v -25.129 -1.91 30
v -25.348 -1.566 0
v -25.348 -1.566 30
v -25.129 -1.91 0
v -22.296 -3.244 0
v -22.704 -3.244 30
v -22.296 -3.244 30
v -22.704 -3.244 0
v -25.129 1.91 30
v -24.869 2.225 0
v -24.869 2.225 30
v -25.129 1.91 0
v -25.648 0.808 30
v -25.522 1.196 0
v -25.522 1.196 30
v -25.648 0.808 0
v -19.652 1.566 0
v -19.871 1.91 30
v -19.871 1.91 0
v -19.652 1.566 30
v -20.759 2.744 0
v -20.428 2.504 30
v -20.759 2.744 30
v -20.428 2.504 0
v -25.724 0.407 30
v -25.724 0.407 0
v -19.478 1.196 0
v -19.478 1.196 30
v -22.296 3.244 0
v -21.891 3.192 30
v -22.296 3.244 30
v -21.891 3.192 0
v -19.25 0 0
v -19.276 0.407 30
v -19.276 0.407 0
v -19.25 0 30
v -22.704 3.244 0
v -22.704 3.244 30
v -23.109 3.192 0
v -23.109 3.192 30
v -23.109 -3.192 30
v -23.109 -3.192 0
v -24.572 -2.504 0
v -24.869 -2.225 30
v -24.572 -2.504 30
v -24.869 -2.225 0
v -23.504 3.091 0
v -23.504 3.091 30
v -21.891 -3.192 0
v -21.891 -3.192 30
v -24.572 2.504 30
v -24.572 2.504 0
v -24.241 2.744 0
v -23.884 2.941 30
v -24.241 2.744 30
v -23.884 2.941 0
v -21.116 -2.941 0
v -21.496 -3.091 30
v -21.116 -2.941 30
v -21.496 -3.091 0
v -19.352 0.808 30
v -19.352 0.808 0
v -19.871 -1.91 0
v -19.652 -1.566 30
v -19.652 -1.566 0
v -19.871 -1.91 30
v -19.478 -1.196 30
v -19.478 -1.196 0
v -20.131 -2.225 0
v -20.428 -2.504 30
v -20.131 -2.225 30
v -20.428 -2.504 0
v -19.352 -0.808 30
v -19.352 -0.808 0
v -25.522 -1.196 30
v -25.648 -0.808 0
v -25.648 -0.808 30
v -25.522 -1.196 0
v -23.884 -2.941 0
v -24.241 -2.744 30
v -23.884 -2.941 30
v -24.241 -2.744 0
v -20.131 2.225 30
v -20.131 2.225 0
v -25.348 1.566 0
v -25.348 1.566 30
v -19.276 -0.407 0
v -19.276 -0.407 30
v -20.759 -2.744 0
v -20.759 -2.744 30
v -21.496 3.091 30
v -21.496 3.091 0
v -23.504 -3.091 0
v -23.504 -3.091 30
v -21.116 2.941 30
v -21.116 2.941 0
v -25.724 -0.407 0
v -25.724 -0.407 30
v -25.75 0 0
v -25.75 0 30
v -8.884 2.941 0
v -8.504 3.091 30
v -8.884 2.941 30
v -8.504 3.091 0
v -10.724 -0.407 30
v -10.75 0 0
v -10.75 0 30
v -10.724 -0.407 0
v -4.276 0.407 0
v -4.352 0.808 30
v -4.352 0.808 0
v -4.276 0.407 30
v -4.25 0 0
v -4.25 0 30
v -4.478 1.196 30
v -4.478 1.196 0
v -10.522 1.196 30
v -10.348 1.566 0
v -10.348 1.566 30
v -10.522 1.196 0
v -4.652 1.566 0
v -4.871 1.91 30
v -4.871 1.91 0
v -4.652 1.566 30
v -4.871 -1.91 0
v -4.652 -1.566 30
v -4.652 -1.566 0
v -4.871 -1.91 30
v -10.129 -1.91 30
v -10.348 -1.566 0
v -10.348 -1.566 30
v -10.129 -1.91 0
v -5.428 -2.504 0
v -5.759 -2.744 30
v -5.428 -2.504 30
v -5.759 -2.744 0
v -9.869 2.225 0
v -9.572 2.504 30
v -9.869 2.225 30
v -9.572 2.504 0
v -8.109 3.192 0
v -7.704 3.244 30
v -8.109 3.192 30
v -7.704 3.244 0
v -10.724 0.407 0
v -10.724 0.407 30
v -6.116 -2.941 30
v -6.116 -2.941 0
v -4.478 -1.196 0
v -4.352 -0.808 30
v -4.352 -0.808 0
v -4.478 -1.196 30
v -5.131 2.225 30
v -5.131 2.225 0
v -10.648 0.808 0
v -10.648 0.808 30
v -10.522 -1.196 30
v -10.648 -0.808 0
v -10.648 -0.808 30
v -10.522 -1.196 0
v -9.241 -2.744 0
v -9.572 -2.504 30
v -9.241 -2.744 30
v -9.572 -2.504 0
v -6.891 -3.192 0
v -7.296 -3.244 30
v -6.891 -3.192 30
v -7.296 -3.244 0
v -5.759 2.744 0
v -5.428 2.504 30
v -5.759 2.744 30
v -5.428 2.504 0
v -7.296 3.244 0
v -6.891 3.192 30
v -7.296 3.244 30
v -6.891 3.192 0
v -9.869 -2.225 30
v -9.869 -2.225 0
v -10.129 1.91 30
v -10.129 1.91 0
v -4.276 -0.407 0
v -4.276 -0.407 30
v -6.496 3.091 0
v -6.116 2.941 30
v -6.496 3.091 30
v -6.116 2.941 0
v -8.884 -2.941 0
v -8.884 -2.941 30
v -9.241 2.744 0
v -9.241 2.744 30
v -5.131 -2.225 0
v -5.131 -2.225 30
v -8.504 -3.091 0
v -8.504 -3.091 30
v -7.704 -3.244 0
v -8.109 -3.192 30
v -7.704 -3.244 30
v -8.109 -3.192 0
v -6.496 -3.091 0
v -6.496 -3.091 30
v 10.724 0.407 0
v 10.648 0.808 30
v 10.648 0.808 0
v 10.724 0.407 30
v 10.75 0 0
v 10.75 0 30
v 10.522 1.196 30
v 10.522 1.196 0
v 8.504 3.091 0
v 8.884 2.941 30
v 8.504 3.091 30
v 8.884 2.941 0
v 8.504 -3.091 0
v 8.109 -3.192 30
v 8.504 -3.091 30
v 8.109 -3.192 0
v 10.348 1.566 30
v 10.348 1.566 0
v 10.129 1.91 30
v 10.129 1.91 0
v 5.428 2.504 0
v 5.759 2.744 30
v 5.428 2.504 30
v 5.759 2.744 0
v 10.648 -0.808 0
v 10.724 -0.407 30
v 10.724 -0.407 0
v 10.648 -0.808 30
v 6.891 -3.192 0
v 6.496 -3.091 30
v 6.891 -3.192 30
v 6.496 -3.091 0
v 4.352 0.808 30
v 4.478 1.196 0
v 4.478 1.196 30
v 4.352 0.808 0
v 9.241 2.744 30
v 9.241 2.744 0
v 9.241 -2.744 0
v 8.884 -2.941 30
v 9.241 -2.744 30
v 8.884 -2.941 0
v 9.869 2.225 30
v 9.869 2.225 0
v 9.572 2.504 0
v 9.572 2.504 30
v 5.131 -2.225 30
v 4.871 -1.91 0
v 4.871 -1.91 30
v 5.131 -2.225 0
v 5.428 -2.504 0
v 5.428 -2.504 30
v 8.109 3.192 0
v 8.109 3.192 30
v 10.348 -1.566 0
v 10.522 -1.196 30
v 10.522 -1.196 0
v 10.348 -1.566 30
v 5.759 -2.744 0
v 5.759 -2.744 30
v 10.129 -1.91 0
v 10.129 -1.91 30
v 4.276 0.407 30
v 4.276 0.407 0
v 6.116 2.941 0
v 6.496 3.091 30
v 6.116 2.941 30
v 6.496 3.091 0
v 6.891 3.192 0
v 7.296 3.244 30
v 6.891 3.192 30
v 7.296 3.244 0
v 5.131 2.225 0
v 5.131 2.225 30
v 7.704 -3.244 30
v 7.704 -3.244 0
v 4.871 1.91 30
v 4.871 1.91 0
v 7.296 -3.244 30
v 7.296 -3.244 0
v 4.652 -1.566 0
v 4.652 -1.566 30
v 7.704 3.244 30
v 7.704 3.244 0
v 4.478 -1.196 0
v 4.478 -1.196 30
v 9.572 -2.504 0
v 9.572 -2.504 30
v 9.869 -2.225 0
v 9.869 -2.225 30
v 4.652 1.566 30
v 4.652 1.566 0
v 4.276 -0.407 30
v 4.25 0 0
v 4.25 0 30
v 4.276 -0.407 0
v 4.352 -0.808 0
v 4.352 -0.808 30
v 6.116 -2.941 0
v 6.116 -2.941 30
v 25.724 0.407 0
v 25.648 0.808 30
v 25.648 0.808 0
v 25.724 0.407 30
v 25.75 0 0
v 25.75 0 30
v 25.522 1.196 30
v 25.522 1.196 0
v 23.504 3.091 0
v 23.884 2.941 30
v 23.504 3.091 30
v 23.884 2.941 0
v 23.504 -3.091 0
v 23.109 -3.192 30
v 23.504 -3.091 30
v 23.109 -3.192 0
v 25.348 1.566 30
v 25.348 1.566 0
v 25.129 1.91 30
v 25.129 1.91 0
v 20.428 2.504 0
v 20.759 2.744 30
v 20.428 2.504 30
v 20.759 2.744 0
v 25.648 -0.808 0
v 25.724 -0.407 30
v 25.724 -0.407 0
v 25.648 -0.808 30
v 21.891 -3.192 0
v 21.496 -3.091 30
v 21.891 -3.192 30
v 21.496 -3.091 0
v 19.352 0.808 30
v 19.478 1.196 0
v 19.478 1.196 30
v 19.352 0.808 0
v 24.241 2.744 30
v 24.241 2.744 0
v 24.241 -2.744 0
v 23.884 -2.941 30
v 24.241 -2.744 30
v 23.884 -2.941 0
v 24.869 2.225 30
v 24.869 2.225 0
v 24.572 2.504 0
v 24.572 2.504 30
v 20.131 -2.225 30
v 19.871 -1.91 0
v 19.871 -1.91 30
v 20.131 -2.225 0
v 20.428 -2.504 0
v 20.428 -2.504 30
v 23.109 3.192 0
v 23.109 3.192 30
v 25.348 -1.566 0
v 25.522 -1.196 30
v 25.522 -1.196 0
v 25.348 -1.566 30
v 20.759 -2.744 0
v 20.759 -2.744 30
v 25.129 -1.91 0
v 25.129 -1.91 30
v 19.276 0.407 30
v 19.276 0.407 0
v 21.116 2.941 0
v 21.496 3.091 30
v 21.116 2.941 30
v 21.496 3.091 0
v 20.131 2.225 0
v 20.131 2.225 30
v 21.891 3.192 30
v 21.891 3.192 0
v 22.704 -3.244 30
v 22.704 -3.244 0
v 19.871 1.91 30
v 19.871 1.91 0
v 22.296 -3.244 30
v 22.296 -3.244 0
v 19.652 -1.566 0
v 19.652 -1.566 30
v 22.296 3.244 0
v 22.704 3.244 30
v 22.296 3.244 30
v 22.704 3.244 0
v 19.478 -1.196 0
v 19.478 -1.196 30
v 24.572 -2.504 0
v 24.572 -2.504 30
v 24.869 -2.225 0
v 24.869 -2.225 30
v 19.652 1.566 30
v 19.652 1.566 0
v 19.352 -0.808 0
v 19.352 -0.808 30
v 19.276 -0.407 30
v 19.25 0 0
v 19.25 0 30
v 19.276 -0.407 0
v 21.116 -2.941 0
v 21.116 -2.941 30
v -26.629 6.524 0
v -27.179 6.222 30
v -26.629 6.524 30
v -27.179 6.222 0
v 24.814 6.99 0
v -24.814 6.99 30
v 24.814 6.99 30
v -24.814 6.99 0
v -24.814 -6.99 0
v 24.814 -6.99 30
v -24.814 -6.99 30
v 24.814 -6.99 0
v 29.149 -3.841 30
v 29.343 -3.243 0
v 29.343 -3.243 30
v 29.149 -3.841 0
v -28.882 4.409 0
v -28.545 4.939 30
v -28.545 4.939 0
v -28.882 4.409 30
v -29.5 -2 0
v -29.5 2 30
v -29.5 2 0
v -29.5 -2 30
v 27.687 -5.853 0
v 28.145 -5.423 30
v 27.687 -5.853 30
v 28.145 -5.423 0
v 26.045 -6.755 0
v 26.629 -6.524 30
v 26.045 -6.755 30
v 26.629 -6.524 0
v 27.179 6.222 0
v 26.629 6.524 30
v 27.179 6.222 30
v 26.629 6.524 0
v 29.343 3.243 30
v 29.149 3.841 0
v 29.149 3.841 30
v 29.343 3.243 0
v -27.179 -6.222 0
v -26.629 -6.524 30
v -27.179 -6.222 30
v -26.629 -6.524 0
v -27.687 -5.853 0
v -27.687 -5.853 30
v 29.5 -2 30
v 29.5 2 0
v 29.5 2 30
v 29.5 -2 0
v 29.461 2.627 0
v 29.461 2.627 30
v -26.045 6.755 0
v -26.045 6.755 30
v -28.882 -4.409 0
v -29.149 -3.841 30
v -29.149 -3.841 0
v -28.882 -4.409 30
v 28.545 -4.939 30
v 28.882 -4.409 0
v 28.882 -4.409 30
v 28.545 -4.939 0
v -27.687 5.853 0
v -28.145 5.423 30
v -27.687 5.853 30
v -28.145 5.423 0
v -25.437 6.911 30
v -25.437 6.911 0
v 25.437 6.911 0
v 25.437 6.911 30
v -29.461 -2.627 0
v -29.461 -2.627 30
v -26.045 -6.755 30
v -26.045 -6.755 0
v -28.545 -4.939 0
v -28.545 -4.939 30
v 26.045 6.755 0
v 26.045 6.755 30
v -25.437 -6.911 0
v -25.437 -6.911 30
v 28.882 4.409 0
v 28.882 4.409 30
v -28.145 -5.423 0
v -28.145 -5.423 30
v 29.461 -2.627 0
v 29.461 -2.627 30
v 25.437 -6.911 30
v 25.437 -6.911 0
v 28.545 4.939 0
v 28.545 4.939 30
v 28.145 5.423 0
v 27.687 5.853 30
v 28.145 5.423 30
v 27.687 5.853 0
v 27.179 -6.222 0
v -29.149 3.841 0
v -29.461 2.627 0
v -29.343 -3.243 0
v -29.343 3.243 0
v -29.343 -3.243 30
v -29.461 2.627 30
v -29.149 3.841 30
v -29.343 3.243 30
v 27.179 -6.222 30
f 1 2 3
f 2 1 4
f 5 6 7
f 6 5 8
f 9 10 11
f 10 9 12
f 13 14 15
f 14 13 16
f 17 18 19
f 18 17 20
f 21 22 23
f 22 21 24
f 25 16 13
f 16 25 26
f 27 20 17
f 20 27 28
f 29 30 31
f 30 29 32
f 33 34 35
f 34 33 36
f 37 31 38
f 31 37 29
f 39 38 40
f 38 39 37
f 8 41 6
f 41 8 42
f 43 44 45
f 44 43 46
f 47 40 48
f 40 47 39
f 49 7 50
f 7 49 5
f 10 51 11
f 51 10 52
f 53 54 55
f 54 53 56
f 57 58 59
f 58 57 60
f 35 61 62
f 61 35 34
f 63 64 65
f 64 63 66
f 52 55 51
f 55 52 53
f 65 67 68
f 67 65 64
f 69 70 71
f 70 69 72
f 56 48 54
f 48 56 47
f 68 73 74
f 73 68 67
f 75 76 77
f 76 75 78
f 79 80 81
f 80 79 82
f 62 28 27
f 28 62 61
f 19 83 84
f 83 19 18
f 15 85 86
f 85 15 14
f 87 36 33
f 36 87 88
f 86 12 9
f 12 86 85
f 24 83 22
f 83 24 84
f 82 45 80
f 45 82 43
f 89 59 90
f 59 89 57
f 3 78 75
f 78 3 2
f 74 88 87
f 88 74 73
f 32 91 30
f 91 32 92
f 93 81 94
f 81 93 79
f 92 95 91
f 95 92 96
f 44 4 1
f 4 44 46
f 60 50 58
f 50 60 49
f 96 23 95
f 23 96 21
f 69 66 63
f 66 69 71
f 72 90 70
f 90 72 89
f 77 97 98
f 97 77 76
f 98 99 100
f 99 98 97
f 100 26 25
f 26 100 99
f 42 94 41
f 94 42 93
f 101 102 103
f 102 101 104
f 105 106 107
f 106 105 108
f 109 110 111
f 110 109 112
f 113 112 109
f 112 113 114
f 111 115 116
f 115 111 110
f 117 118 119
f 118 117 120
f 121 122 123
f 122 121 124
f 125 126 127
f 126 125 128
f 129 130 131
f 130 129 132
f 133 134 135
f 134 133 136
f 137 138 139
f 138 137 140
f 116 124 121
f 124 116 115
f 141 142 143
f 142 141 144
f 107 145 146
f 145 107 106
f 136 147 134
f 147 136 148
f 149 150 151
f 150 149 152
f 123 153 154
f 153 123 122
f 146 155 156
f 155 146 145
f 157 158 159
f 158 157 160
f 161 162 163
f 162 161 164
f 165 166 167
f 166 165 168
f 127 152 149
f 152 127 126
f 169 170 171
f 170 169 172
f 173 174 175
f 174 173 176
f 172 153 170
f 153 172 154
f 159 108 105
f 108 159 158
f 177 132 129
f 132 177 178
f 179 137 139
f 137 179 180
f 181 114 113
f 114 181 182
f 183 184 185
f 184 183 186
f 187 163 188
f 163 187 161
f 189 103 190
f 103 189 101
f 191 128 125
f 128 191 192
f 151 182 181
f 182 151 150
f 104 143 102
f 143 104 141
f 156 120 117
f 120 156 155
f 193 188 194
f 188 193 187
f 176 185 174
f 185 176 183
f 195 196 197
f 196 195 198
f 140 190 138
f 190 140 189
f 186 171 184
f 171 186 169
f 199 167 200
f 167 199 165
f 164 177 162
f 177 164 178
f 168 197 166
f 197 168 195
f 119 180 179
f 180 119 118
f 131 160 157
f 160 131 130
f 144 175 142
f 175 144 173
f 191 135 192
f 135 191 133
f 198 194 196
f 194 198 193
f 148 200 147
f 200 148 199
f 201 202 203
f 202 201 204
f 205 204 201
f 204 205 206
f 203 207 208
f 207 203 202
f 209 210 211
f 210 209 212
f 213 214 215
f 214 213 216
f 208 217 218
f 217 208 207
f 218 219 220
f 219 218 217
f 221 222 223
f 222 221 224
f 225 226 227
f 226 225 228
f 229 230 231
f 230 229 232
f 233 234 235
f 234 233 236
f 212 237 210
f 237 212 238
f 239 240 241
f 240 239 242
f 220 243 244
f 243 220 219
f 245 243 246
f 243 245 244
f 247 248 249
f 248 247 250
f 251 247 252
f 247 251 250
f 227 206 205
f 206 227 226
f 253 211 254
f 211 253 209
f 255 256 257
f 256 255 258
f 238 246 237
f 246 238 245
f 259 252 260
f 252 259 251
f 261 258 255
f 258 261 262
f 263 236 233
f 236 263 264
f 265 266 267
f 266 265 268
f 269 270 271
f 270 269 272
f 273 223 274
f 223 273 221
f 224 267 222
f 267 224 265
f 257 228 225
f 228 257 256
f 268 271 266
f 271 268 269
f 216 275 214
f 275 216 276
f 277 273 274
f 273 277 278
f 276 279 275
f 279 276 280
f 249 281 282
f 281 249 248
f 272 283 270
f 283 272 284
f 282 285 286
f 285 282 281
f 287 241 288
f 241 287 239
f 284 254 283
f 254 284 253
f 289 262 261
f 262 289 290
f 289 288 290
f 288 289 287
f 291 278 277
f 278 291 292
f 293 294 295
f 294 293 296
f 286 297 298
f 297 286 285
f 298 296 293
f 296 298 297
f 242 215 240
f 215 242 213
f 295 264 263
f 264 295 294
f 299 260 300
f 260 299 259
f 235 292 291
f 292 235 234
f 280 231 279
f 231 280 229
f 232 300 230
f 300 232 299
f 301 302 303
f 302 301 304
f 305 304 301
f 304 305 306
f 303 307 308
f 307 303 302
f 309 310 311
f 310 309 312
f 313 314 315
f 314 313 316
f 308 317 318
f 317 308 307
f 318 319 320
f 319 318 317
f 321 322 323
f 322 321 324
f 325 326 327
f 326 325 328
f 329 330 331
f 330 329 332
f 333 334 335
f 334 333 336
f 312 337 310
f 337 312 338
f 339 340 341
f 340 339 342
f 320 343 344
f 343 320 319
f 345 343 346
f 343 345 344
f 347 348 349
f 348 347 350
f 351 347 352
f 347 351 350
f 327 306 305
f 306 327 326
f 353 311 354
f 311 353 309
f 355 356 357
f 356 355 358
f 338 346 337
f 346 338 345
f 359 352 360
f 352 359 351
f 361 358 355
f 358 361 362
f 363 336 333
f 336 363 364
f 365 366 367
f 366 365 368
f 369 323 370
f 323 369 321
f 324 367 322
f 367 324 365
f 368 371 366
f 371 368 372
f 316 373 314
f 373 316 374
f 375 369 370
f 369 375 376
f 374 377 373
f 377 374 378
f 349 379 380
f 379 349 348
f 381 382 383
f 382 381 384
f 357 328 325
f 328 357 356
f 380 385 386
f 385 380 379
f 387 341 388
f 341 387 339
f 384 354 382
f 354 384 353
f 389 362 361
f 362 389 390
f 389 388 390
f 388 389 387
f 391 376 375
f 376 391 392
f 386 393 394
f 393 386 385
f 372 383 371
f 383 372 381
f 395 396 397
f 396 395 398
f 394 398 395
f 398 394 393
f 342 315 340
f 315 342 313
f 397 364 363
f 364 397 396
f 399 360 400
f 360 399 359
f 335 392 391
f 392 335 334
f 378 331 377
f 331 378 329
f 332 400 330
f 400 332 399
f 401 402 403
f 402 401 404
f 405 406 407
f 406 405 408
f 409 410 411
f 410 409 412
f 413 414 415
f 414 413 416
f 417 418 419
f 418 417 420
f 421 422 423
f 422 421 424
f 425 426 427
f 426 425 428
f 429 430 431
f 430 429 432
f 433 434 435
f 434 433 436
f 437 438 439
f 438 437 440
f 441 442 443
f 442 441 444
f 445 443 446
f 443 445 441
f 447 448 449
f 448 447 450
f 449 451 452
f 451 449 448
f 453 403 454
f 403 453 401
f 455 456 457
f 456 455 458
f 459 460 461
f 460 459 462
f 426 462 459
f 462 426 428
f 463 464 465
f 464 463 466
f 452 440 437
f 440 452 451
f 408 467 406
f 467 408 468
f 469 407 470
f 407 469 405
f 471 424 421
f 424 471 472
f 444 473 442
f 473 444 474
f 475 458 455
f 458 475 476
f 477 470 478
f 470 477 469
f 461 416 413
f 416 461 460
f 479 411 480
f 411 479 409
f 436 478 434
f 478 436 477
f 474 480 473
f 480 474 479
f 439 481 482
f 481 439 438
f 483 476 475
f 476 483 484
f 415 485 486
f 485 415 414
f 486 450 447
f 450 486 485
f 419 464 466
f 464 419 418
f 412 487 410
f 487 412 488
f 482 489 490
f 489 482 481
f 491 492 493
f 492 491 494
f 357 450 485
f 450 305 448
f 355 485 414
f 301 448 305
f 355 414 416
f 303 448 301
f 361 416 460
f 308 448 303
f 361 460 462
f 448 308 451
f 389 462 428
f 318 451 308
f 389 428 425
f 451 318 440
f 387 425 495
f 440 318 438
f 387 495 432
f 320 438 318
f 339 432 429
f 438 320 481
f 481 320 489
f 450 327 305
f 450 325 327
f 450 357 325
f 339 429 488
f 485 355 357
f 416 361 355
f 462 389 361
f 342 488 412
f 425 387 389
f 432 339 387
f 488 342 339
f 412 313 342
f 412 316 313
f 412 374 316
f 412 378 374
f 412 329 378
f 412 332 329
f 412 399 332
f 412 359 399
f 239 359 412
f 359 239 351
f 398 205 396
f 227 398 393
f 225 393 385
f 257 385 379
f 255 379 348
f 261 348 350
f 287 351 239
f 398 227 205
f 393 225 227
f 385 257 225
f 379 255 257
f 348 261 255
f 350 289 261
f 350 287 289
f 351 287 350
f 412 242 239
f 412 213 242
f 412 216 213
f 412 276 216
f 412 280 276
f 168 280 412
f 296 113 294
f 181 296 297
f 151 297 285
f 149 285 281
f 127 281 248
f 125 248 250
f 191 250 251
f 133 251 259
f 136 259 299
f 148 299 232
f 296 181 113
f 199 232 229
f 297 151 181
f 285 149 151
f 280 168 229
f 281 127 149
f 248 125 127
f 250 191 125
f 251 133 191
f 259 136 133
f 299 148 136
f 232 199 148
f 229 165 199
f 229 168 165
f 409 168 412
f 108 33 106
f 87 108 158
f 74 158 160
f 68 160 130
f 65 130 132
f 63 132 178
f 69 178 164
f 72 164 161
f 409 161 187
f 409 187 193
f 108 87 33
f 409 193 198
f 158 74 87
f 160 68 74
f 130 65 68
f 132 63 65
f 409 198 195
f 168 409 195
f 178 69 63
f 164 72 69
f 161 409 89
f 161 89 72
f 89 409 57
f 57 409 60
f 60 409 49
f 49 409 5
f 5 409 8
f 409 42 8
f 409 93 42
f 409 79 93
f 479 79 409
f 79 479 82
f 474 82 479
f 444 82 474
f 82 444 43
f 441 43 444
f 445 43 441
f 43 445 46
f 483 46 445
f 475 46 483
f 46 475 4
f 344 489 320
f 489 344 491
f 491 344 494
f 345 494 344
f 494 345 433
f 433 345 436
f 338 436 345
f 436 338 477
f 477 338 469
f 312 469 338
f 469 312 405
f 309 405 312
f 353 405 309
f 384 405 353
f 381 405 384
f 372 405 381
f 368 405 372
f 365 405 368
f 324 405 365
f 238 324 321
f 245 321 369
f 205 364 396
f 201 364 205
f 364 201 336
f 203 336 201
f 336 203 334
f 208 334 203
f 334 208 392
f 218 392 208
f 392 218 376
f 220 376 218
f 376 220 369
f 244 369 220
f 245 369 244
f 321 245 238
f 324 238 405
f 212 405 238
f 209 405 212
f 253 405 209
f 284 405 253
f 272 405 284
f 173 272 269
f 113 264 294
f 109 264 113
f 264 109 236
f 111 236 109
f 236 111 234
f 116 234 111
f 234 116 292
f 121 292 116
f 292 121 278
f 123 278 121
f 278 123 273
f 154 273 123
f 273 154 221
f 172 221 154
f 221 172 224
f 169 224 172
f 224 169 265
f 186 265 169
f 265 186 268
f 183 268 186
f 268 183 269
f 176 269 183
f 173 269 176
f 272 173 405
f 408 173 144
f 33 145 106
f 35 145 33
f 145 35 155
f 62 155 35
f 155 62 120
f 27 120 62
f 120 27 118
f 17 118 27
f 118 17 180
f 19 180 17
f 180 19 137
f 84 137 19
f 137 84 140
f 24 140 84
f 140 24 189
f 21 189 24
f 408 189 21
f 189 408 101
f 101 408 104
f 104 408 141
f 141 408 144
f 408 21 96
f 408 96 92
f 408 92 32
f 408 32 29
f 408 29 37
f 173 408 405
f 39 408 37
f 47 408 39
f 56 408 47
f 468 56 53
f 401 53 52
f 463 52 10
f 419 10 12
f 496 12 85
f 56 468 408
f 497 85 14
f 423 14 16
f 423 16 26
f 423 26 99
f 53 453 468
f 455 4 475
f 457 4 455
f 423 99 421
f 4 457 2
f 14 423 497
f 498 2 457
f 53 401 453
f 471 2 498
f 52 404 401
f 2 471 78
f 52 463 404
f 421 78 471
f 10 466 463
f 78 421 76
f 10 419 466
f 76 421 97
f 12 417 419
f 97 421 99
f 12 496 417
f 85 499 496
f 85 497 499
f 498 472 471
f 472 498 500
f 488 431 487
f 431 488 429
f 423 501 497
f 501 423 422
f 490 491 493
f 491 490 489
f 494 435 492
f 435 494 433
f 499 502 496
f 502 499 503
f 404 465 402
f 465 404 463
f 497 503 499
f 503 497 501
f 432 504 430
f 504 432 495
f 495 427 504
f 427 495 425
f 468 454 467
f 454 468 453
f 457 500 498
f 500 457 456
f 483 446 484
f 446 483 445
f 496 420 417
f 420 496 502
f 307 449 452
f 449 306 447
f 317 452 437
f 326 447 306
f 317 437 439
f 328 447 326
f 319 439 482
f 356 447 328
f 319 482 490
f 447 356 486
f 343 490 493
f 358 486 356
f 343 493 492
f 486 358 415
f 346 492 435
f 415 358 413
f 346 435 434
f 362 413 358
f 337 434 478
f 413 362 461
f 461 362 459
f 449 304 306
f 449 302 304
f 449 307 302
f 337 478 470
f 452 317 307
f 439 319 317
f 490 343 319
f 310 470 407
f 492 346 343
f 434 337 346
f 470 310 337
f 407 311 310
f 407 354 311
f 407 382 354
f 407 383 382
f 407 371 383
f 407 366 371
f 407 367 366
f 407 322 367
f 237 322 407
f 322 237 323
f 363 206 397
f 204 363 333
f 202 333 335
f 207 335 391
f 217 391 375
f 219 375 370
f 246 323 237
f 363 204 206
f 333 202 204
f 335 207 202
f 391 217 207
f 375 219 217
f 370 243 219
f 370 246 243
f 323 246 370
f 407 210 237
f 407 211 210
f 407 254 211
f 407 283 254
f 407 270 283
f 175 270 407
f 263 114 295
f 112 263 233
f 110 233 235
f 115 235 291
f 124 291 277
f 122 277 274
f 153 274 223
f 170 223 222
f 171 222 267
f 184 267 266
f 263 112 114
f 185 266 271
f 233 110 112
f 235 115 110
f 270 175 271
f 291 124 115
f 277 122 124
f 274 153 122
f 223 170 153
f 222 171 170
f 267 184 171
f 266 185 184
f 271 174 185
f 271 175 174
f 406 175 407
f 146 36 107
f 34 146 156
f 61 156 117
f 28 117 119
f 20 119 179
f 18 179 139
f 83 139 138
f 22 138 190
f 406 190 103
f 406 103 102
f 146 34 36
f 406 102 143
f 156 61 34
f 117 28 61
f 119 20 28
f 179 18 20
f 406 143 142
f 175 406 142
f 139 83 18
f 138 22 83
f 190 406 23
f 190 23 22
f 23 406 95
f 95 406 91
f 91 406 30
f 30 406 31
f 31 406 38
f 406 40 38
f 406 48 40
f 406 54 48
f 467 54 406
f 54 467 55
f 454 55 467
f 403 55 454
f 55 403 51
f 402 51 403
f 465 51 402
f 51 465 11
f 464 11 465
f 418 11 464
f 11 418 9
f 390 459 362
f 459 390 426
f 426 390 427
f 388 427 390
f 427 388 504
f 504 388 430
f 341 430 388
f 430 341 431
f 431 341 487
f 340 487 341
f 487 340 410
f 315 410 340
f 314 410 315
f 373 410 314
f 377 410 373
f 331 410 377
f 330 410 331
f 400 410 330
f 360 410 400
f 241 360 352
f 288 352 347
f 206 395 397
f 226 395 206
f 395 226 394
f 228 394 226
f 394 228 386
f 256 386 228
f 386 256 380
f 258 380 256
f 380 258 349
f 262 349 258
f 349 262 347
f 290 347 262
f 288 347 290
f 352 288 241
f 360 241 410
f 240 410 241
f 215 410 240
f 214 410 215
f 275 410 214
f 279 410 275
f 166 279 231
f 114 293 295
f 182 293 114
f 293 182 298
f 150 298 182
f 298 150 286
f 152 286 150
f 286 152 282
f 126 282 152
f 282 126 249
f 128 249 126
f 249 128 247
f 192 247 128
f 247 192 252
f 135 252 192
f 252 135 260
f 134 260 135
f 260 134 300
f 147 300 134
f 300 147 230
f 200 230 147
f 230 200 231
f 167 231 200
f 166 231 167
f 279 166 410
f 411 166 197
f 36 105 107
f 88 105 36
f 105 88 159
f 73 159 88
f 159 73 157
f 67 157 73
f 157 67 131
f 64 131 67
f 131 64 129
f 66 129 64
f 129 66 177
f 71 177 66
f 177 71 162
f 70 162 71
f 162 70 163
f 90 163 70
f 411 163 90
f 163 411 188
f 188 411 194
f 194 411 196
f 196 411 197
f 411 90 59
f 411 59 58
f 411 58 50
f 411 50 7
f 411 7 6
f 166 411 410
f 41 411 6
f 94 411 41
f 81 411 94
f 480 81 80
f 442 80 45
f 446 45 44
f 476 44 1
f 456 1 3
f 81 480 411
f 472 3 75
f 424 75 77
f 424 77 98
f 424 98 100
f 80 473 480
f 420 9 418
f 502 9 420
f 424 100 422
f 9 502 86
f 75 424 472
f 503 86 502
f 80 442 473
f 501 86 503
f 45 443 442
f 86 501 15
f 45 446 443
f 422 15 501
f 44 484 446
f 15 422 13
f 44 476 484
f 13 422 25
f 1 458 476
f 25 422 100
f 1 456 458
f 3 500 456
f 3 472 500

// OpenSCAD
$fn = 50;


difference() {
	union() {
		hull() {
			translate(v = [-24.5000000000, 2.0000000000, 0]) {
				cylinder(h = 30, r = 5);
			}
			translate(v = [24.5000000000, 2.0000000000, 0]) {
				cylinder(h = 30, r = 5);
			}
			translate(v = [-24.5000000000, -2.0000000000, 0]) {
				cylinder(h = 30, r = 5);
			}
			translate(v = [24.5000000000, -2.0000000000, 0]) {
				cylinder(h = 30, r = 5);
			}
		}
	}
	union() {
		translate(v = [-22.5000000000, 0.0000000000, -100.0000000000]) {
			cylinder(h = 200, r = 3.2500000000);
		}
		translate(v = [-7.5000000000, 0.0000000000, -100.0000000000]) {
			cylinder(h = 200, r = 3.2500000000);
		}
		translate(v = [7.5000000000, 0.0000000000, -100.0000000000]) {
			cylinder(h = 200, r = 3.2500000000);
		}
		translate(v = [22.5000000000, 0.0000000000, -100.0000000000]) {
			cylinder(h = 200, r = 3.2500000000);
		}
	}
}
